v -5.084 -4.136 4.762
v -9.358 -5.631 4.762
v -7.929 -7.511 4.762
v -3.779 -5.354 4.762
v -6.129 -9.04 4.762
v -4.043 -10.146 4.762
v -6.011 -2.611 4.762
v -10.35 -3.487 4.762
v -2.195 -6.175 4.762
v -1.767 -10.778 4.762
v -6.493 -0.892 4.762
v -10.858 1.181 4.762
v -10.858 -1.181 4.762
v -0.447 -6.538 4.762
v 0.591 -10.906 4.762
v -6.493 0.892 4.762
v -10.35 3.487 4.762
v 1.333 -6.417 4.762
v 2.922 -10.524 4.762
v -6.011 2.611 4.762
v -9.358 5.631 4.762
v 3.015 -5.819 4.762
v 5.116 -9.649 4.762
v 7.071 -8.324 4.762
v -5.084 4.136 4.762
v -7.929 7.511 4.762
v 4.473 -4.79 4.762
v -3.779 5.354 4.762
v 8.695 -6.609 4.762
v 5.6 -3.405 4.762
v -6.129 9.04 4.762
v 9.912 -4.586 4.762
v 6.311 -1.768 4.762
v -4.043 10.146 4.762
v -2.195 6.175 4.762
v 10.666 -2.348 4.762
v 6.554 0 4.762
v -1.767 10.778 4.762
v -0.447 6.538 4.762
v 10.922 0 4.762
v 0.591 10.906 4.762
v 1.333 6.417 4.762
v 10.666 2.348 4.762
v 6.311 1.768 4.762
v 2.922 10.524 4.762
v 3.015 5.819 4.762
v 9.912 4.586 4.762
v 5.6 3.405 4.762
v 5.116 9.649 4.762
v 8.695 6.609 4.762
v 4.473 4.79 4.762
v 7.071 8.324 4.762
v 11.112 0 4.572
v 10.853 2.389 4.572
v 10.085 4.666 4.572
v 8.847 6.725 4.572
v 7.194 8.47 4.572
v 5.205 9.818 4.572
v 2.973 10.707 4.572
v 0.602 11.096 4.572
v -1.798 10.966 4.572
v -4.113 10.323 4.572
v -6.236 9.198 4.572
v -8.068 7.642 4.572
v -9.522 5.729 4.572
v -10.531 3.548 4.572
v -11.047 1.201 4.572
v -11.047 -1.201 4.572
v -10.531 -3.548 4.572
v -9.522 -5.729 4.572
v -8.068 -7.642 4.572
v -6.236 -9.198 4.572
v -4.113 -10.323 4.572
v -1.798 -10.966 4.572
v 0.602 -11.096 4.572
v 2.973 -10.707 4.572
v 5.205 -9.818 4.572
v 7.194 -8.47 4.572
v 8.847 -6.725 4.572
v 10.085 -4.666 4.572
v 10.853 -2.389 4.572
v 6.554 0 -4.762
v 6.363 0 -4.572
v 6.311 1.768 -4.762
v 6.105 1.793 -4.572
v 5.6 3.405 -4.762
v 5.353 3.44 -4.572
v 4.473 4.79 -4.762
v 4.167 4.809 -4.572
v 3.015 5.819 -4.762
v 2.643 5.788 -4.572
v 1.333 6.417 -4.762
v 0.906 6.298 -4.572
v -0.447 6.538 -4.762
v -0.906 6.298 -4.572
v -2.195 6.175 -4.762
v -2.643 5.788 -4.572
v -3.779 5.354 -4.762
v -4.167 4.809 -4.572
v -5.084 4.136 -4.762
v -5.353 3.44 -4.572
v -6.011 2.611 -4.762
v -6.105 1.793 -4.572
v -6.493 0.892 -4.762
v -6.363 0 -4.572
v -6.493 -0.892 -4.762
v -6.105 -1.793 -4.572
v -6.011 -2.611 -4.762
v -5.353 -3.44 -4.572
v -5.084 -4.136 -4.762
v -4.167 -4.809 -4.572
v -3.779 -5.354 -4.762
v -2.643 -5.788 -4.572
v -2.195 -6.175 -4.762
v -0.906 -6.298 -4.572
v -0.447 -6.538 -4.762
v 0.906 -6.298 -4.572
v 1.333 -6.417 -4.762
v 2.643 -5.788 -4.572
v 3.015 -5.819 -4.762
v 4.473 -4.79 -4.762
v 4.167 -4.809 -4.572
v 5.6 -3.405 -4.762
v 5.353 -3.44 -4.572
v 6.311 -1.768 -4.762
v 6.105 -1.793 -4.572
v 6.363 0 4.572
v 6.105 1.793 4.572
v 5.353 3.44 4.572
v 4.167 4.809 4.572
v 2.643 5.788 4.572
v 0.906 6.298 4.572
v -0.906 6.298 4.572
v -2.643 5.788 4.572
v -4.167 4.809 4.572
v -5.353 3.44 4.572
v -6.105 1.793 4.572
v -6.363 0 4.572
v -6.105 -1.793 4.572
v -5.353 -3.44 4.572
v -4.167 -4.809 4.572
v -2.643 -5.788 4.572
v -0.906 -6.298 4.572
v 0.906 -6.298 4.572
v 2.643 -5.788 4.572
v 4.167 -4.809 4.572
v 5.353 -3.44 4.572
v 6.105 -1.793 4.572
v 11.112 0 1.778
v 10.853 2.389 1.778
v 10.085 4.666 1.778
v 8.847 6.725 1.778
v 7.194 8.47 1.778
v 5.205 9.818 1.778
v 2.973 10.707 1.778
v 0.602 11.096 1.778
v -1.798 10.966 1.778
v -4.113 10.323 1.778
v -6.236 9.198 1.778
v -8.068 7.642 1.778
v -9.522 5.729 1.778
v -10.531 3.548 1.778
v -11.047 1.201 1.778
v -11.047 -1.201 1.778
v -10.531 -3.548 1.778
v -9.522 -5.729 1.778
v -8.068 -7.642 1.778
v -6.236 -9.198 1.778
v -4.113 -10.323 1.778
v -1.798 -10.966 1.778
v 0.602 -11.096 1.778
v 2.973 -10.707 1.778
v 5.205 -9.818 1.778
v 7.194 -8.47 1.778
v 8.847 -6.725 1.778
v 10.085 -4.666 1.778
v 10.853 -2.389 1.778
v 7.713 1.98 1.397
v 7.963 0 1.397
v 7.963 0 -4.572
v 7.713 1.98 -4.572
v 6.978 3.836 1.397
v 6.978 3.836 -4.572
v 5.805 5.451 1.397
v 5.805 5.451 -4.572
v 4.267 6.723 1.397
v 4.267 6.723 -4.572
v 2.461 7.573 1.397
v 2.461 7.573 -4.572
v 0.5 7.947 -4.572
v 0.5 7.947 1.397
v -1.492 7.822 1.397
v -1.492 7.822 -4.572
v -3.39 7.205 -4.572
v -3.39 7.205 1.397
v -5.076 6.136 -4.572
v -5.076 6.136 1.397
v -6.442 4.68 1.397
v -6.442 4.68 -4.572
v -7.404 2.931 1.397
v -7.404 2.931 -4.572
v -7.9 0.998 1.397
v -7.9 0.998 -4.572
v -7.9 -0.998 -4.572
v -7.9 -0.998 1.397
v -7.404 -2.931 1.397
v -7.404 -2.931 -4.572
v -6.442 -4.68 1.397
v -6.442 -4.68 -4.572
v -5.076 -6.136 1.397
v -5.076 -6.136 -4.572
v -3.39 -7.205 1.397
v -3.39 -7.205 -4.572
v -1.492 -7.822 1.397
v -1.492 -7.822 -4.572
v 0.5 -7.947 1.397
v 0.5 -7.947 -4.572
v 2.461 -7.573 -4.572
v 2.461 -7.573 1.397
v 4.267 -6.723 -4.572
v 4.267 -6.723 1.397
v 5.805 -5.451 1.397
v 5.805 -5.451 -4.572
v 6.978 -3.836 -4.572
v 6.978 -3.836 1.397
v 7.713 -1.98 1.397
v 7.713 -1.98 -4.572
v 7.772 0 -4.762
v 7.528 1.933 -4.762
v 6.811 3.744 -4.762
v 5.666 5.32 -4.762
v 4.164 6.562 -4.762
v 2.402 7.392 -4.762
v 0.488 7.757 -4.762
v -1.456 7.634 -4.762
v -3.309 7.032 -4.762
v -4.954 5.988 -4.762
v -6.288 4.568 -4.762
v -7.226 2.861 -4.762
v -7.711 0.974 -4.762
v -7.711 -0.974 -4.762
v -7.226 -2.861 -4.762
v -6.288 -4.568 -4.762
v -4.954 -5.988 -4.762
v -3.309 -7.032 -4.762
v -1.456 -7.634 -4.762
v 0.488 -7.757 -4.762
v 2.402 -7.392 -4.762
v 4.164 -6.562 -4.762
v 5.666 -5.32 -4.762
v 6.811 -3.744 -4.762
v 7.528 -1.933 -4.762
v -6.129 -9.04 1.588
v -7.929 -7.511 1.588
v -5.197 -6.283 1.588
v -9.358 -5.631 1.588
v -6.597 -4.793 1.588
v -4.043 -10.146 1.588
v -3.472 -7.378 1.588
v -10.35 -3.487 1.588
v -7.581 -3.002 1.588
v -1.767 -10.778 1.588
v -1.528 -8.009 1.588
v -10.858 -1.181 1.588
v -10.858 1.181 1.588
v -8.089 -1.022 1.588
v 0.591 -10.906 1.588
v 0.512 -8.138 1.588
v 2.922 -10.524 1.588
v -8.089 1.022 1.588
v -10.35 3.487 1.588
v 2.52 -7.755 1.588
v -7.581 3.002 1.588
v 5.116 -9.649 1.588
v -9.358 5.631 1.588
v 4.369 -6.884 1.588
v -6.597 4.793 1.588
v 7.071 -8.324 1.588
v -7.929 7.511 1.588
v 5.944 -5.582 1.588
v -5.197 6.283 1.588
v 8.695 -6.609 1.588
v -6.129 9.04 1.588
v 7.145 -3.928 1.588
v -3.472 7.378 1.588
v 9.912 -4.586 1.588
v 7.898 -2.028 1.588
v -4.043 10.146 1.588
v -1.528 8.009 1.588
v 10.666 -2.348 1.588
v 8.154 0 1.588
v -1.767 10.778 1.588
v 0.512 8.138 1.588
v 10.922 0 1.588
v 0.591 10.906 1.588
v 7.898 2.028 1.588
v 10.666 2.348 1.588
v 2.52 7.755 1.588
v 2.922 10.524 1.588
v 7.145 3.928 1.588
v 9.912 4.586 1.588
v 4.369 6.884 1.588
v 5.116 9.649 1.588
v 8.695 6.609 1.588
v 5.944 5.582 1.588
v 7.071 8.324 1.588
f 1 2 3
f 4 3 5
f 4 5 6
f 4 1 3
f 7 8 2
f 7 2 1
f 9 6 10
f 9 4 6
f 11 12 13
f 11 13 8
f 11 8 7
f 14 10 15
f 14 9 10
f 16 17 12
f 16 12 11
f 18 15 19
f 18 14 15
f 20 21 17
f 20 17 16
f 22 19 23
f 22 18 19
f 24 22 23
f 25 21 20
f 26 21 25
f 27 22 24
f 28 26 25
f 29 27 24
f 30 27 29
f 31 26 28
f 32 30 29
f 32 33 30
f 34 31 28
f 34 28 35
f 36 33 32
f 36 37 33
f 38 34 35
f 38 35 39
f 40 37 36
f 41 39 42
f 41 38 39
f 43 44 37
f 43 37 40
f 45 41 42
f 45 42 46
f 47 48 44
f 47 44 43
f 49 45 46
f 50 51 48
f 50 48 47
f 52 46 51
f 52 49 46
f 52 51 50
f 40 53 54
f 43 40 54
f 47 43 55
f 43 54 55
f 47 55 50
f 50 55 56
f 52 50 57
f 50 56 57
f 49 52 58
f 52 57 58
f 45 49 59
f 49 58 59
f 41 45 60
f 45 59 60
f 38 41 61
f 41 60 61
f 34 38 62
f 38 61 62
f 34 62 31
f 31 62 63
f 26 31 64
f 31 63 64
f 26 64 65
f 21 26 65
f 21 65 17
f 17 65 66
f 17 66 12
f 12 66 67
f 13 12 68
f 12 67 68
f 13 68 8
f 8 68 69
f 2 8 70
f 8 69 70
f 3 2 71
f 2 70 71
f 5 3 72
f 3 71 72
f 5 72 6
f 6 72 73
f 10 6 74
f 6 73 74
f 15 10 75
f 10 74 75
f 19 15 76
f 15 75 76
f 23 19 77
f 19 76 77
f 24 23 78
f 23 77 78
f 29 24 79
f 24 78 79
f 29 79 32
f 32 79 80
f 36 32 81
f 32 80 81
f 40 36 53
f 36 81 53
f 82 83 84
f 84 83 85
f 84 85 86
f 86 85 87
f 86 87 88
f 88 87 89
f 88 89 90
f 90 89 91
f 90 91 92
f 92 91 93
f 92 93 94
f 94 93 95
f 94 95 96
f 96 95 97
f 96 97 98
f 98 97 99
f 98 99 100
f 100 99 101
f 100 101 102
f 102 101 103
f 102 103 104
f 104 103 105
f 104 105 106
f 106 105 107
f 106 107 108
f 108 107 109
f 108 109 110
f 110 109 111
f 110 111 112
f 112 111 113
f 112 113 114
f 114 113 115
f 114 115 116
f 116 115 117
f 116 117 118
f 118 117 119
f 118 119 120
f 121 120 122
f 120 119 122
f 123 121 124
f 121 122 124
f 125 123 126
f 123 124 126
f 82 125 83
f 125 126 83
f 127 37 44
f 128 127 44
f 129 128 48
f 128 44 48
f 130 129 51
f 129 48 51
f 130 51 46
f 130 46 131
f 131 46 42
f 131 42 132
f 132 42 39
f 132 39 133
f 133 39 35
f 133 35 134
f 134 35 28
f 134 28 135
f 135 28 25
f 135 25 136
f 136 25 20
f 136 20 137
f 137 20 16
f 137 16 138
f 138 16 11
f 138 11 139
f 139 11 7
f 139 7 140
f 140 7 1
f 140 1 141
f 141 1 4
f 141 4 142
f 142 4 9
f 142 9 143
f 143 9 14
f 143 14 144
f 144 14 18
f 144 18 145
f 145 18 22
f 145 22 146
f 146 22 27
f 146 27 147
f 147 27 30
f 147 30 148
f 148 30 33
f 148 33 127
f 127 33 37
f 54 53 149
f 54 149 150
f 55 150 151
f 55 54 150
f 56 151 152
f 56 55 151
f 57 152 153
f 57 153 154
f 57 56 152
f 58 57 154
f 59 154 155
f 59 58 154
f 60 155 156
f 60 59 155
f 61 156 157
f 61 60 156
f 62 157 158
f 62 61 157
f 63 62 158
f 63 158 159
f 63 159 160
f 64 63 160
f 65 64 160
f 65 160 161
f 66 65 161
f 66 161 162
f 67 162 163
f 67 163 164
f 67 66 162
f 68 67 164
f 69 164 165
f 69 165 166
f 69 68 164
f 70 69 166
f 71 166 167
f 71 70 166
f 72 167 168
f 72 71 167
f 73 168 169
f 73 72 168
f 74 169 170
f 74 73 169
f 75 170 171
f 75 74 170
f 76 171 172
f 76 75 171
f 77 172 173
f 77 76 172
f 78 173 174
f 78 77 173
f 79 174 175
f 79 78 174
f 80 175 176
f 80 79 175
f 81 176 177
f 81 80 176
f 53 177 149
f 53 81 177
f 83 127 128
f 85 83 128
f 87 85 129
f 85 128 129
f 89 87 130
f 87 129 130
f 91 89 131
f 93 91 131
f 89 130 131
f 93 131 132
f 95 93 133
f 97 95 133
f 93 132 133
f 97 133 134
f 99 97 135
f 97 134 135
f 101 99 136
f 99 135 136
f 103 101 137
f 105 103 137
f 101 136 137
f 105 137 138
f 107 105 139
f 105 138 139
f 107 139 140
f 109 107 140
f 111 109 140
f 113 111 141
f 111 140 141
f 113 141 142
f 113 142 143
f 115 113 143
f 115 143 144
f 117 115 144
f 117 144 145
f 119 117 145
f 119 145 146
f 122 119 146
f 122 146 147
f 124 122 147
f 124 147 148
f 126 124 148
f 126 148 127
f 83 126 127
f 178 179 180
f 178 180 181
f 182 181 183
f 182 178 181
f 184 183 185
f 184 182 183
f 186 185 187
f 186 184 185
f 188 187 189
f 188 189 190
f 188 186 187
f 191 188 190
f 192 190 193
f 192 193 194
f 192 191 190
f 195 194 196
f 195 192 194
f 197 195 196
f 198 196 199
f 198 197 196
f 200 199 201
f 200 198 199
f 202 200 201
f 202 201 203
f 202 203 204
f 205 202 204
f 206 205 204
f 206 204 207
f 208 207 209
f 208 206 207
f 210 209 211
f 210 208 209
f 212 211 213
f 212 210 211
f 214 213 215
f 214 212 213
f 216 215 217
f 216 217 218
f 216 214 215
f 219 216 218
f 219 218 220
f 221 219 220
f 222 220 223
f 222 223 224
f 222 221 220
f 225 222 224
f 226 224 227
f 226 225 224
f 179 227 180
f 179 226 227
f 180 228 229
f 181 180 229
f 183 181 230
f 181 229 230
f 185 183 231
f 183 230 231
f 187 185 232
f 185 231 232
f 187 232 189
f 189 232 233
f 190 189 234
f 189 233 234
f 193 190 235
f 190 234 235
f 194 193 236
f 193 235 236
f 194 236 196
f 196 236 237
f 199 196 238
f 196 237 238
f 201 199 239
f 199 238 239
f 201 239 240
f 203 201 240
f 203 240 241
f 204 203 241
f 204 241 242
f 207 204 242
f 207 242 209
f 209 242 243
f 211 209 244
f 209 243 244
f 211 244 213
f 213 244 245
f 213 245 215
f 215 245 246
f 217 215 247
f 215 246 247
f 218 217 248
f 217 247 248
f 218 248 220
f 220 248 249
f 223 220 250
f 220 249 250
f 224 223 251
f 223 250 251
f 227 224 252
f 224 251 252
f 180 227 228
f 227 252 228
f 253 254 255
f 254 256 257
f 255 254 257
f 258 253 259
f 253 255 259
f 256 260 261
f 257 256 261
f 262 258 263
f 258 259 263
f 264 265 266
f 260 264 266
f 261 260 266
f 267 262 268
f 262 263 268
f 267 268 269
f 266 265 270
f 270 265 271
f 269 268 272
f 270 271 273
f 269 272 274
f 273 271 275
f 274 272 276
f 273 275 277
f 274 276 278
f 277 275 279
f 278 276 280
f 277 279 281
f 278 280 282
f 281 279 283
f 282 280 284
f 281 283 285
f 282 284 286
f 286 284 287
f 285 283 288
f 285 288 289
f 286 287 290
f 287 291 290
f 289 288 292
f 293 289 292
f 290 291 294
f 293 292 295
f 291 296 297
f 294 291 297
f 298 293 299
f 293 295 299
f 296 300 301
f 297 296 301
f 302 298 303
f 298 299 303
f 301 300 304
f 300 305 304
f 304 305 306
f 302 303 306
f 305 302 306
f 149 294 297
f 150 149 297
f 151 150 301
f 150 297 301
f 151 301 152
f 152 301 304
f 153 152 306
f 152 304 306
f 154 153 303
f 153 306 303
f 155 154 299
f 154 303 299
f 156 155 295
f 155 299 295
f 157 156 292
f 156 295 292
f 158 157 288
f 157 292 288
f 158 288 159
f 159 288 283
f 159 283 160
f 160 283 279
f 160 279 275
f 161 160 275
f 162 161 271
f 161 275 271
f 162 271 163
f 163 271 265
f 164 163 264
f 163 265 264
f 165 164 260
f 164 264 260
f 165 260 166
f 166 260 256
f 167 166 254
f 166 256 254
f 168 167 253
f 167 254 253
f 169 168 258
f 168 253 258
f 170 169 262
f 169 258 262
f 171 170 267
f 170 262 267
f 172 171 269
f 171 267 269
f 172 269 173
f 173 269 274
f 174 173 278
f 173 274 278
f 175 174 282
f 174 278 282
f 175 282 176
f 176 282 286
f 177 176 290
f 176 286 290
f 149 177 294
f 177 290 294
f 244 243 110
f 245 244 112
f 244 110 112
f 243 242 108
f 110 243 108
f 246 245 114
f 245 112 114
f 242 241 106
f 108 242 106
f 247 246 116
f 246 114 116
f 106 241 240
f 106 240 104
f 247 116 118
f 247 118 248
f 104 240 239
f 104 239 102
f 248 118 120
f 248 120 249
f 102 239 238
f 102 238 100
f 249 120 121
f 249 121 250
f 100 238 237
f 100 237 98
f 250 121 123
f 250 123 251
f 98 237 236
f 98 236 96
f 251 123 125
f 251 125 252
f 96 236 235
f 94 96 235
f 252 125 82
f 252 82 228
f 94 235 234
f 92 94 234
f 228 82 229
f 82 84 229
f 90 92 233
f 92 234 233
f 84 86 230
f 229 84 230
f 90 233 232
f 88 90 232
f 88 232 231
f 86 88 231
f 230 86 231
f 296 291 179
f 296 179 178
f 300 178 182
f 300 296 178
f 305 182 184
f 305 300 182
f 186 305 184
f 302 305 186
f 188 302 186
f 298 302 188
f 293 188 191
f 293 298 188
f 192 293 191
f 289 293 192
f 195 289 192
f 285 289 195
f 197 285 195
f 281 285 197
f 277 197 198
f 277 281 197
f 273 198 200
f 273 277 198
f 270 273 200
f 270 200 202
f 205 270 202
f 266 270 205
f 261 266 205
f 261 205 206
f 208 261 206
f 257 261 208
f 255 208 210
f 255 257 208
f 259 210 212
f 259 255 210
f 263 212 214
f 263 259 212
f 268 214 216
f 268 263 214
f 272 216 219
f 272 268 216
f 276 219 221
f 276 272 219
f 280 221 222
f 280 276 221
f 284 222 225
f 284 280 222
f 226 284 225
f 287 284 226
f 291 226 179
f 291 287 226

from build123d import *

# Parameters (mm, degrees)
BOSS_EXTRUDE1_START = 4.7625
SKETCH3_R           = 11.1125
SKETCH3_R_2         = 6.3627
BOSS_EXTRUDE1_DEPTH = 3.175
BOSS_EXTRUDE2_START = 1.5875
SKETCH4_R           = 7.9629
SKETCH4_R_2         = 6.3627
BOSS_EXTRUDE2_DEPTH = 6.35
CHAMFER1_SIZE       = 0.190881


with BuildPart() as part:
    # Sketch3 → Boss-Extrude1 (new body)
    with BuildSketch(Plane.XY.offset(BOSS_EXTRUDE1_START)):
        Circle(SKETCH3_R)
        Circle(SKETCH3_R_2, mode=Mode.SUBTRACT)
    extrude(amount=-BOSS_EXTRUDE1_DEPTH)

    # Sketch4 → Boss-Extrude2 (add)
    with BuildSketch(Plane.XY.offset(BOSS_EXTRUDE2_START)):
        Circle(SKETCH4_R)
        Circle(SKETCH4_R_2, mode=Mode.SUBTRACT)
    extrude(amount=-BOSS_EXTRUDE2_DEPTH)

    # Chamfer1
    chamfer1_edges = [part.edges().sort_by_distance(p)[0] for p in [
        (-6.3627, 0, -4.7625),
        (-7.9629, 0, 1.5875),
        (-11.1125, 0, 4.7625),
        (-11.1125, 0, 1.5875),
        (-6.3627, 0, 4.7625),
        (-7.9629, 0, -4.7625),
    ]]
    chamfer(chamfer1_edges, length=CHAMFER1_SIZE)


solid = part.part
